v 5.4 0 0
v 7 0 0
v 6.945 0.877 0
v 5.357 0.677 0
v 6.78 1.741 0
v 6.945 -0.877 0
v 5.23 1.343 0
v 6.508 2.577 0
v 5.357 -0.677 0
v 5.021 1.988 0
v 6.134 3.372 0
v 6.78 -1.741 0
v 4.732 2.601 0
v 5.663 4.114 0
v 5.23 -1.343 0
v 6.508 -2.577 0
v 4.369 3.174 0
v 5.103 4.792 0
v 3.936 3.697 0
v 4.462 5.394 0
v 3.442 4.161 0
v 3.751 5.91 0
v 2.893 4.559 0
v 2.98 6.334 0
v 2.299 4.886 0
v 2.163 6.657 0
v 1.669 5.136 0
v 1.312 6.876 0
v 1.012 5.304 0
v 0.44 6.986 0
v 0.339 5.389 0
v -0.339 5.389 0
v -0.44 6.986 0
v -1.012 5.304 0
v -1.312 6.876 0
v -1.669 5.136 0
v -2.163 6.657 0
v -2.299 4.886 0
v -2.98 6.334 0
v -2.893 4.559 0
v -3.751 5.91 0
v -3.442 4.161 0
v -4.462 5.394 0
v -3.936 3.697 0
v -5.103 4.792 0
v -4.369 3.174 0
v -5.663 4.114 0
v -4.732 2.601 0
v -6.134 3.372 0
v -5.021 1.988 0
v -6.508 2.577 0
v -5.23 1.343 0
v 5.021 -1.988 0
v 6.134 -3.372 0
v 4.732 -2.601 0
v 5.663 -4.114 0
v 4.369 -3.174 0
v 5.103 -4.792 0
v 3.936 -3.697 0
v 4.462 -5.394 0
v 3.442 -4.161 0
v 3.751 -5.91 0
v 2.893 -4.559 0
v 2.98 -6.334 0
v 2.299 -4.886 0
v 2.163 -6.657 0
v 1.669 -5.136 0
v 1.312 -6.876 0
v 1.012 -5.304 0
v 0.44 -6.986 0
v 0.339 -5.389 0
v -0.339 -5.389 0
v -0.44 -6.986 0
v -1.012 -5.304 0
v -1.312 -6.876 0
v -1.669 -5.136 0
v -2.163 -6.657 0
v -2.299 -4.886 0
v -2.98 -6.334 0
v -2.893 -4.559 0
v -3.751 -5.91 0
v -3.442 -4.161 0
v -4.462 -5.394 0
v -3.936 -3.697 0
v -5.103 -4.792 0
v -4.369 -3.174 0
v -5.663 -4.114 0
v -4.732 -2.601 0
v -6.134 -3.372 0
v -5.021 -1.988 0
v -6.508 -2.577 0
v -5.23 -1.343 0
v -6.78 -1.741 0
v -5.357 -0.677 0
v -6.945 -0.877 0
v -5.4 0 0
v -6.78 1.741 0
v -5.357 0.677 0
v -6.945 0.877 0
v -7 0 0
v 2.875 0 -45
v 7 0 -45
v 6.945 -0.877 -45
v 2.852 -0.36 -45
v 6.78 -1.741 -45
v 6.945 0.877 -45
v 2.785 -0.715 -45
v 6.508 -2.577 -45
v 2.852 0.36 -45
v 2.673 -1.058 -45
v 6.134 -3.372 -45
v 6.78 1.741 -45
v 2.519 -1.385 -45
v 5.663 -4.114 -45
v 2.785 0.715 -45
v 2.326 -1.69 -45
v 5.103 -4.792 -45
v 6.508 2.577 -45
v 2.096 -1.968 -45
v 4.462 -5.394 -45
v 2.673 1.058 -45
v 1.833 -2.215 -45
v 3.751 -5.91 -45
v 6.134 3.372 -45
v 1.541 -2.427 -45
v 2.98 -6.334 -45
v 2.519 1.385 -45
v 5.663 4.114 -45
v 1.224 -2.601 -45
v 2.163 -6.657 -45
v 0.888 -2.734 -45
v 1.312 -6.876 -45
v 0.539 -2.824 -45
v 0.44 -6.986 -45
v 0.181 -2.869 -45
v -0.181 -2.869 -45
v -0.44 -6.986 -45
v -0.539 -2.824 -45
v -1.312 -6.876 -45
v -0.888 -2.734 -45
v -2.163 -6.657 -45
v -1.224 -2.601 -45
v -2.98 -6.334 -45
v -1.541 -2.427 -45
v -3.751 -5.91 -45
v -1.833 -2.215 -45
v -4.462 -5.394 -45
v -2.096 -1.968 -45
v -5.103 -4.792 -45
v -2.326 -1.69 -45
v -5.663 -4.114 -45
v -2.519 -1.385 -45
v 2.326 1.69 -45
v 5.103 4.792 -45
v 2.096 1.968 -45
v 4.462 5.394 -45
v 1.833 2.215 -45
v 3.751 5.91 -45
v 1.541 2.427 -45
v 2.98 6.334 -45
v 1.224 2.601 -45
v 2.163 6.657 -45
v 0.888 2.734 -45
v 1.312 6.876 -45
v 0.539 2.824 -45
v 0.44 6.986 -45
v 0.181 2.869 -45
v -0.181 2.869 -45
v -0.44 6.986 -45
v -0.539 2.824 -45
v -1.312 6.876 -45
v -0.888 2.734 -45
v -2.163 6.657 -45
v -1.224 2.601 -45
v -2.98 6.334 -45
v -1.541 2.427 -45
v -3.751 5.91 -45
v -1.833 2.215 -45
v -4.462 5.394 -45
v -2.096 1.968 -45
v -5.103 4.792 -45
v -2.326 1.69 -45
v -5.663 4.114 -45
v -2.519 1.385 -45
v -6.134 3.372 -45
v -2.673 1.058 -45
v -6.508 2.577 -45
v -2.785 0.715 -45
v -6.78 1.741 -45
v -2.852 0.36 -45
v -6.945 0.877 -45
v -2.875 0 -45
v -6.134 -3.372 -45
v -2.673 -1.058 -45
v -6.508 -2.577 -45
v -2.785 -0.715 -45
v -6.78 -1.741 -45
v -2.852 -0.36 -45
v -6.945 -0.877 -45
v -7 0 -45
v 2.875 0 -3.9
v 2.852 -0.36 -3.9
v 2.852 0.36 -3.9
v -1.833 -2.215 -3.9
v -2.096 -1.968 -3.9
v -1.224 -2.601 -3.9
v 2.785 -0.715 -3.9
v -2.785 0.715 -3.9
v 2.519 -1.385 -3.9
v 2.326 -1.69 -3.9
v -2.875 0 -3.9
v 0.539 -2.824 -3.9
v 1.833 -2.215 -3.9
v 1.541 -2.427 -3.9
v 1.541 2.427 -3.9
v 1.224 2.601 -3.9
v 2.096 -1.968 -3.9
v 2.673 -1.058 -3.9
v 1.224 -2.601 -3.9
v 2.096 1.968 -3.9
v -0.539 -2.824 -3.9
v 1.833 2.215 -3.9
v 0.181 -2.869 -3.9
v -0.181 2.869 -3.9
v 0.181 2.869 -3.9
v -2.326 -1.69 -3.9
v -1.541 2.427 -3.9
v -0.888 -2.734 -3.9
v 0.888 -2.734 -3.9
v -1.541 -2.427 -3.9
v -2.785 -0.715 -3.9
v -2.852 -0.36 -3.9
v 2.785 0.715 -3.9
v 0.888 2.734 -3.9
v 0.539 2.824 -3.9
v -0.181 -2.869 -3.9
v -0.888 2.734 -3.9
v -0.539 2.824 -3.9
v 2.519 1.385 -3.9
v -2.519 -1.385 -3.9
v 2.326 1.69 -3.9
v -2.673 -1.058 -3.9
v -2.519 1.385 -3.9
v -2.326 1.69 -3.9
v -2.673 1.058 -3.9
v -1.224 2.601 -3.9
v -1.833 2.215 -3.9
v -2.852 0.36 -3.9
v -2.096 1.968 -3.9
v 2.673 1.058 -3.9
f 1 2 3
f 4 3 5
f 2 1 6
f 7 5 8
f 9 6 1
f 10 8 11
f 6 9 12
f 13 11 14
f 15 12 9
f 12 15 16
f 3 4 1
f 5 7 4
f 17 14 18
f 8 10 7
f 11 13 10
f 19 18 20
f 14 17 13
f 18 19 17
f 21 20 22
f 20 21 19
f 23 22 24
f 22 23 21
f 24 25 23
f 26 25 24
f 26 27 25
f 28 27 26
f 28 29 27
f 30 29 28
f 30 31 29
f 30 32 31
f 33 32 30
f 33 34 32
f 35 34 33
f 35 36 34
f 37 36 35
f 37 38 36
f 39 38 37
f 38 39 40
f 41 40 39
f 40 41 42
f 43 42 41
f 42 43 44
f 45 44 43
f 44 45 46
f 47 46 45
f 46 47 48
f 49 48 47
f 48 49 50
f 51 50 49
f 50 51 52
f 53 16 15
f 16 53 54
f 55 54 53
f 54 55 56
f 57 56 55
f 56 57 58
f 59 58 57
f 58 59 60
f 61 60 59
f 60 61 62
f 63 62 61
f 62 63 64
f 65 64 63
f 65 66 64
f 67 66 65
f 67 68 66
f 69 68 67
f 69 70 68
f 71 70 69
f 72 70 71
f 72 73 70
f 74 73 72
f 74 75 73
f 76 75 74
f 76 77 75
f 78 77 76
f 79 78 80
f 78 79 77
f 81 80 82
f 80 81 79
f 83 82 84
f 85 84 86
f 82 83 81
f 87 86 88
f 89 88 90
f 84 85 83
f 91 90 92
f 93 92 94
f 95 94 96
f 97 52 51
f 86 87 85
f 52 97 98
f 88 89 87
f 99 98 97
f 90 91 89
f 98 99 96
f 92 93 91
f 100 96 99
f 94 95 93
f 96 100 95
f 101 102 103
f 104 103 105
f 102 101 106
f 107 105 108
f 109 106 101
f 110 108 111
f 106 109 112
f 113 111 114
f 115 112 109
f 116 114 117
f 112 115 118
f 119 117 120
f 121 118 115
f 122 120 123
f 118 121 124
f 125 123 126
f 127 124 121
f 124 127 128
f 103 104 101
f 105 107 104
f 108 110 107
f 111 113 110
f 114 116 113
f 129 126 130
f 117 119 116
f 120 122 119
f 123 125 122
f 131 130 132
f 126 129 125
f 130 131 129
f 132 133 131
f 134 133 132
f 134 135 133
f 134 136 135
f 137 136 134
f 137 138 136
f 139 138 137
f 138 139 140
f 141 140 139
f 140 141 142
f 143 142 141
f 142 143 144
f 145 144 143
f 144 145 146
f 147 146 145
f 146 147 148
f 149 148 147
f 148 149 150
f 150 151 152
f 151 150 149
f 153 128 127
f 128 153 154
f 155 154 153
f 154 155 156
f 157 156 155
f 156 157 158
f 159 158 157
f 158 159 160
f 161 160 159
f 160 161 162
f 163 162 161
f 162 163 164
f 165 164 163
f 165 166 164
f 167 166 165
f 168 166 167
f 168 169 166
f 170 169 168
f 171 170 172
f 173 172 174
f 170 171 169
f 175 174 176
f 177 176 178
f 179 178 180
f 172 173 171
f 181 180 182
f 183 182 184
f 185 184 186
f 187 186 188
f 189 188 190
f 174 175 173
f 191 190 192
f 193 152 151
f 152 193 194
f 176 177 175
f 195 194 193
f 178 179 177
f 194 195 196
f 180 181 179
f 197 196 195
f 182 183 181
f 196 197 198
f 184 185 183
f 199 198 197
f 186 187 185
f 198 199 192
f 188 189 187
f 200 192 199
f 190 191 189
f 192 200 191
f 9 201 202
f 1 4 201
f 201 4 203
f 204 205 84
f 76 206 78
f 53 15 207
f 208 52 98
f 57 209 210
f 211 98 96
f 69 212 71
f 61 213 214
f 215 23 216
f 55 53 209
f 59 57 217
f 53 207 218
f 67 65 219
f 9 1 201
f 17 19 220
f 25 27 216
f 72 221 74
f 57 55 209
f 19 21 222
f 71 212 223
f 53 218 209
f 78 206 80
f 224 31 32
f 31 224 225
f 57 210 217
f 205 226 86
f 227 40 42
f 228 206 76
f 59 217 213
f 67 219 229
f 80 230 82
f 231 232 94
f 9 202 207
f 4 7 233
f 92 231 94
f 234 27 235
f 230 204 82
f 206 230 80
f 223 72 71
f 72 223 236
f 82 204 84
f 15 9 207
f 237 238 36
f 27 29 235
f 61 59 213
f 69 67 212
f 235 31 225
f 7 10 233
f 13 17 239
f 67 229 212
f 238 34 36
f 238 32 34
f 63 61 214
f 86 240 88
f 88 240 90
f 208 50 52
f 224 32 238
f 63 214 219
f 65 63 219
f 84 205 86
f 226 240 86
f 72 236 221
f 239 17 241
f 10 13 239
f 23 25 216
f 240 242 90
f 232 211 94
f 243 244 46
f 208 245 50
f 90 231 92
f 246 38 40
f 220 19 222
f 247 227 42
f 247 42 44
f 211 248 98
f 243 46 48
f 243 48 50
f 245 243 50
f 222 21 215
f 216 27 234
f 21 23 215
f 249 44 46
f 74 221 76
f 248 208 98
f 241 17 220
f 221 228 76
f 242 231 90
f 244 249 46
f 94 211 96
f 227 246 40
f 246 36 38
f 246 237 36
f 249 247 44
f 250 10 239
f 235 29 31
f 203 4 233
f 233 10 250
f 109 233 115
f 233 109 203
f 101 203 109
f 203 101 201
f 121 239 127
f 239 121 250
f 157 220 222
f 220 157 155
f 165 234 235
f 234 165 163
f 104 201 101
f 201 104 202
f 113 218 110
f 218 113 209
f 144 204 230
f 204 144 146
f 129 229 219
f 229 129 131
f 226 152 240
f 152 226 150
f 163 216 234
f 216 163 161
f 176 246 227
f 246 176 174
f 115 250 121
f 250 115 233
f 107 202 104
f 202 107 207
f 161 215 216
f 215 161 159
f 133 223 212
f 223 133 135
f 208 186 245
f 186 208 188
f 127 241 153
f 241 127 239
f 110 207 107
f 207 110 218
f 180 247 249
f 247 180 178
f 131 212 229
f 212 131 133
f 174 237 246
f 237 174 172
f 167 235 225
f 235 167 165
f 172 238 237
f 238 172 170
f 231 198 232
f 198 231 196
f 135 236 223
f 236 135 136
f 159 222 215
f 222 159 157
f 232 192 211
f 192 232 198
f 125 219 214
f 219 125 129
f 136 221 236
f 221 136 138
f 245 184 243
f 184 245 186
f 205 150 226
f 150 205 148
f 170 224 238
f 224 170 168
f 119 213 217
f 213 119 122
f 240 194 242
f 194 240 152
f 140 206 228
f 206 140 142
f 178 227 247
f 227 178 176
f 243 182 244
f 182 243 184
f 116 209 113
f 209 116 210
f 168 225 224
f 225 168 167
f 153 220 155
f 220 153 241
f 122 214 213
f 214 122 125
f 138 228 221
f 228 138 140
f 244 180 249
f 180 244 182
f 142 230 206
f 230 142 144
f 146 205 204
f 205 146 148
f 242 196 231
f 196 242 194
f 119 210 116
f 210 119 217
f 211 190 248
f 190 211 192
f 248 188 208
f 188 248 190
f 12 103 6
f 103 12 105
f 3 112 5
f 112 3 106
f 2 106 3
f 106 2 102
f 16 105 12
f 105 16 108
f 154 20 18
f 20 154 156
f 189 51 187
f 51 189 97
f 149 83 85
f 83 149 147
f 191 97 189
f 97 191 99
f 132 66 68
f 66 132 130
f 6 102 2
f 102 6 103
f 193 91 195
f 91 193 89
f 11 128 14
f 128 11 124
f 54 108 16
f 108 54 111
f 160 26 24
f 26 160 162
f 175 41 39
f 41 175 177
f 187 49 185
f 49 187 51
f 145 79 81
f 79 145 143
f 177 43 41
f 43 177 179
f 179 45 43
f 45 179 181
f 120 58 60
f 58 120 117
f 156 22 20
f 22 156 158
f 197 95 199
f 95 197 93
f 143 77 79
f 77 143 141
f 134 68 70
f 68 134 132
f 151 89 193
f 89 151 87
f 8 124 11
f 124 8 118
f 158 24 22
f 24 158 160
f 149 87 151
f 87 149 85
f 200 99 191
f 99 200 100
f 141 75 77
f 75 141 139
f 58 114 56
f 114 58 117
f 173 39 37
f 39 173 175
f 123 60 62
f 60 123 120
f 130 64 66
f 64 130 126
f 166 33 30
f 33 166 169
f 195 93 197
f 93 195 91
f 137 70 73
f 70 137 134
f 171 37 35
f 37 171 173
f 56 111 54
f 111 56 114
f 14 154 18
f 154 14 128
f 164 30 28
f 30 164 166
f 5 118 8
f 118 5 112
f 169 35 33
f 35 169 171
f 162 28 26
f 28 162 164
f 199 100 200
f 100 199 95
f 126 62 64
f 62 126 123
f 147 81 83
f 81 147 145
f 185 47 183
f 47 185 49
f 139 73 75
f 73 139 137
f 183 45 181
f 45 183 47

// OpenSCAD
$fn = 50;


difference() {
	union() {
		translate(v = [0, 0, -45.0000000000]) {
			cylinder(h = 45, r = 7.0000000000);
		}
		cylinder(h = 0, r = 10.0000000000);
	}
	union() {
		translate(v = [0, 0, 0]) {
			rotate(a = [0, 0, 0]) {
				difference() {
					union() {
						#translate(v = [0, 0, -45.0000000000]) {
							cylinder(h = 45, r = 2.6000000000);
						}
						#translate(v = [0, 0, -3.9000000000]) {
							cylinder(h = 3.9000000000, r1 = 2.8750000000, r2 = 5.4000000000);
						}
						#translate(v = [0, 0, -45.0000000000]) {
							cylinder(h = 45, r = 2.8750000000);
						}
						#translate(v = [0, 0, -45.0000000000]) {
							cylinder(h = 45, r = 2.6000000000);
						}
					}
					union();
				}
			}
		}
	}
}
